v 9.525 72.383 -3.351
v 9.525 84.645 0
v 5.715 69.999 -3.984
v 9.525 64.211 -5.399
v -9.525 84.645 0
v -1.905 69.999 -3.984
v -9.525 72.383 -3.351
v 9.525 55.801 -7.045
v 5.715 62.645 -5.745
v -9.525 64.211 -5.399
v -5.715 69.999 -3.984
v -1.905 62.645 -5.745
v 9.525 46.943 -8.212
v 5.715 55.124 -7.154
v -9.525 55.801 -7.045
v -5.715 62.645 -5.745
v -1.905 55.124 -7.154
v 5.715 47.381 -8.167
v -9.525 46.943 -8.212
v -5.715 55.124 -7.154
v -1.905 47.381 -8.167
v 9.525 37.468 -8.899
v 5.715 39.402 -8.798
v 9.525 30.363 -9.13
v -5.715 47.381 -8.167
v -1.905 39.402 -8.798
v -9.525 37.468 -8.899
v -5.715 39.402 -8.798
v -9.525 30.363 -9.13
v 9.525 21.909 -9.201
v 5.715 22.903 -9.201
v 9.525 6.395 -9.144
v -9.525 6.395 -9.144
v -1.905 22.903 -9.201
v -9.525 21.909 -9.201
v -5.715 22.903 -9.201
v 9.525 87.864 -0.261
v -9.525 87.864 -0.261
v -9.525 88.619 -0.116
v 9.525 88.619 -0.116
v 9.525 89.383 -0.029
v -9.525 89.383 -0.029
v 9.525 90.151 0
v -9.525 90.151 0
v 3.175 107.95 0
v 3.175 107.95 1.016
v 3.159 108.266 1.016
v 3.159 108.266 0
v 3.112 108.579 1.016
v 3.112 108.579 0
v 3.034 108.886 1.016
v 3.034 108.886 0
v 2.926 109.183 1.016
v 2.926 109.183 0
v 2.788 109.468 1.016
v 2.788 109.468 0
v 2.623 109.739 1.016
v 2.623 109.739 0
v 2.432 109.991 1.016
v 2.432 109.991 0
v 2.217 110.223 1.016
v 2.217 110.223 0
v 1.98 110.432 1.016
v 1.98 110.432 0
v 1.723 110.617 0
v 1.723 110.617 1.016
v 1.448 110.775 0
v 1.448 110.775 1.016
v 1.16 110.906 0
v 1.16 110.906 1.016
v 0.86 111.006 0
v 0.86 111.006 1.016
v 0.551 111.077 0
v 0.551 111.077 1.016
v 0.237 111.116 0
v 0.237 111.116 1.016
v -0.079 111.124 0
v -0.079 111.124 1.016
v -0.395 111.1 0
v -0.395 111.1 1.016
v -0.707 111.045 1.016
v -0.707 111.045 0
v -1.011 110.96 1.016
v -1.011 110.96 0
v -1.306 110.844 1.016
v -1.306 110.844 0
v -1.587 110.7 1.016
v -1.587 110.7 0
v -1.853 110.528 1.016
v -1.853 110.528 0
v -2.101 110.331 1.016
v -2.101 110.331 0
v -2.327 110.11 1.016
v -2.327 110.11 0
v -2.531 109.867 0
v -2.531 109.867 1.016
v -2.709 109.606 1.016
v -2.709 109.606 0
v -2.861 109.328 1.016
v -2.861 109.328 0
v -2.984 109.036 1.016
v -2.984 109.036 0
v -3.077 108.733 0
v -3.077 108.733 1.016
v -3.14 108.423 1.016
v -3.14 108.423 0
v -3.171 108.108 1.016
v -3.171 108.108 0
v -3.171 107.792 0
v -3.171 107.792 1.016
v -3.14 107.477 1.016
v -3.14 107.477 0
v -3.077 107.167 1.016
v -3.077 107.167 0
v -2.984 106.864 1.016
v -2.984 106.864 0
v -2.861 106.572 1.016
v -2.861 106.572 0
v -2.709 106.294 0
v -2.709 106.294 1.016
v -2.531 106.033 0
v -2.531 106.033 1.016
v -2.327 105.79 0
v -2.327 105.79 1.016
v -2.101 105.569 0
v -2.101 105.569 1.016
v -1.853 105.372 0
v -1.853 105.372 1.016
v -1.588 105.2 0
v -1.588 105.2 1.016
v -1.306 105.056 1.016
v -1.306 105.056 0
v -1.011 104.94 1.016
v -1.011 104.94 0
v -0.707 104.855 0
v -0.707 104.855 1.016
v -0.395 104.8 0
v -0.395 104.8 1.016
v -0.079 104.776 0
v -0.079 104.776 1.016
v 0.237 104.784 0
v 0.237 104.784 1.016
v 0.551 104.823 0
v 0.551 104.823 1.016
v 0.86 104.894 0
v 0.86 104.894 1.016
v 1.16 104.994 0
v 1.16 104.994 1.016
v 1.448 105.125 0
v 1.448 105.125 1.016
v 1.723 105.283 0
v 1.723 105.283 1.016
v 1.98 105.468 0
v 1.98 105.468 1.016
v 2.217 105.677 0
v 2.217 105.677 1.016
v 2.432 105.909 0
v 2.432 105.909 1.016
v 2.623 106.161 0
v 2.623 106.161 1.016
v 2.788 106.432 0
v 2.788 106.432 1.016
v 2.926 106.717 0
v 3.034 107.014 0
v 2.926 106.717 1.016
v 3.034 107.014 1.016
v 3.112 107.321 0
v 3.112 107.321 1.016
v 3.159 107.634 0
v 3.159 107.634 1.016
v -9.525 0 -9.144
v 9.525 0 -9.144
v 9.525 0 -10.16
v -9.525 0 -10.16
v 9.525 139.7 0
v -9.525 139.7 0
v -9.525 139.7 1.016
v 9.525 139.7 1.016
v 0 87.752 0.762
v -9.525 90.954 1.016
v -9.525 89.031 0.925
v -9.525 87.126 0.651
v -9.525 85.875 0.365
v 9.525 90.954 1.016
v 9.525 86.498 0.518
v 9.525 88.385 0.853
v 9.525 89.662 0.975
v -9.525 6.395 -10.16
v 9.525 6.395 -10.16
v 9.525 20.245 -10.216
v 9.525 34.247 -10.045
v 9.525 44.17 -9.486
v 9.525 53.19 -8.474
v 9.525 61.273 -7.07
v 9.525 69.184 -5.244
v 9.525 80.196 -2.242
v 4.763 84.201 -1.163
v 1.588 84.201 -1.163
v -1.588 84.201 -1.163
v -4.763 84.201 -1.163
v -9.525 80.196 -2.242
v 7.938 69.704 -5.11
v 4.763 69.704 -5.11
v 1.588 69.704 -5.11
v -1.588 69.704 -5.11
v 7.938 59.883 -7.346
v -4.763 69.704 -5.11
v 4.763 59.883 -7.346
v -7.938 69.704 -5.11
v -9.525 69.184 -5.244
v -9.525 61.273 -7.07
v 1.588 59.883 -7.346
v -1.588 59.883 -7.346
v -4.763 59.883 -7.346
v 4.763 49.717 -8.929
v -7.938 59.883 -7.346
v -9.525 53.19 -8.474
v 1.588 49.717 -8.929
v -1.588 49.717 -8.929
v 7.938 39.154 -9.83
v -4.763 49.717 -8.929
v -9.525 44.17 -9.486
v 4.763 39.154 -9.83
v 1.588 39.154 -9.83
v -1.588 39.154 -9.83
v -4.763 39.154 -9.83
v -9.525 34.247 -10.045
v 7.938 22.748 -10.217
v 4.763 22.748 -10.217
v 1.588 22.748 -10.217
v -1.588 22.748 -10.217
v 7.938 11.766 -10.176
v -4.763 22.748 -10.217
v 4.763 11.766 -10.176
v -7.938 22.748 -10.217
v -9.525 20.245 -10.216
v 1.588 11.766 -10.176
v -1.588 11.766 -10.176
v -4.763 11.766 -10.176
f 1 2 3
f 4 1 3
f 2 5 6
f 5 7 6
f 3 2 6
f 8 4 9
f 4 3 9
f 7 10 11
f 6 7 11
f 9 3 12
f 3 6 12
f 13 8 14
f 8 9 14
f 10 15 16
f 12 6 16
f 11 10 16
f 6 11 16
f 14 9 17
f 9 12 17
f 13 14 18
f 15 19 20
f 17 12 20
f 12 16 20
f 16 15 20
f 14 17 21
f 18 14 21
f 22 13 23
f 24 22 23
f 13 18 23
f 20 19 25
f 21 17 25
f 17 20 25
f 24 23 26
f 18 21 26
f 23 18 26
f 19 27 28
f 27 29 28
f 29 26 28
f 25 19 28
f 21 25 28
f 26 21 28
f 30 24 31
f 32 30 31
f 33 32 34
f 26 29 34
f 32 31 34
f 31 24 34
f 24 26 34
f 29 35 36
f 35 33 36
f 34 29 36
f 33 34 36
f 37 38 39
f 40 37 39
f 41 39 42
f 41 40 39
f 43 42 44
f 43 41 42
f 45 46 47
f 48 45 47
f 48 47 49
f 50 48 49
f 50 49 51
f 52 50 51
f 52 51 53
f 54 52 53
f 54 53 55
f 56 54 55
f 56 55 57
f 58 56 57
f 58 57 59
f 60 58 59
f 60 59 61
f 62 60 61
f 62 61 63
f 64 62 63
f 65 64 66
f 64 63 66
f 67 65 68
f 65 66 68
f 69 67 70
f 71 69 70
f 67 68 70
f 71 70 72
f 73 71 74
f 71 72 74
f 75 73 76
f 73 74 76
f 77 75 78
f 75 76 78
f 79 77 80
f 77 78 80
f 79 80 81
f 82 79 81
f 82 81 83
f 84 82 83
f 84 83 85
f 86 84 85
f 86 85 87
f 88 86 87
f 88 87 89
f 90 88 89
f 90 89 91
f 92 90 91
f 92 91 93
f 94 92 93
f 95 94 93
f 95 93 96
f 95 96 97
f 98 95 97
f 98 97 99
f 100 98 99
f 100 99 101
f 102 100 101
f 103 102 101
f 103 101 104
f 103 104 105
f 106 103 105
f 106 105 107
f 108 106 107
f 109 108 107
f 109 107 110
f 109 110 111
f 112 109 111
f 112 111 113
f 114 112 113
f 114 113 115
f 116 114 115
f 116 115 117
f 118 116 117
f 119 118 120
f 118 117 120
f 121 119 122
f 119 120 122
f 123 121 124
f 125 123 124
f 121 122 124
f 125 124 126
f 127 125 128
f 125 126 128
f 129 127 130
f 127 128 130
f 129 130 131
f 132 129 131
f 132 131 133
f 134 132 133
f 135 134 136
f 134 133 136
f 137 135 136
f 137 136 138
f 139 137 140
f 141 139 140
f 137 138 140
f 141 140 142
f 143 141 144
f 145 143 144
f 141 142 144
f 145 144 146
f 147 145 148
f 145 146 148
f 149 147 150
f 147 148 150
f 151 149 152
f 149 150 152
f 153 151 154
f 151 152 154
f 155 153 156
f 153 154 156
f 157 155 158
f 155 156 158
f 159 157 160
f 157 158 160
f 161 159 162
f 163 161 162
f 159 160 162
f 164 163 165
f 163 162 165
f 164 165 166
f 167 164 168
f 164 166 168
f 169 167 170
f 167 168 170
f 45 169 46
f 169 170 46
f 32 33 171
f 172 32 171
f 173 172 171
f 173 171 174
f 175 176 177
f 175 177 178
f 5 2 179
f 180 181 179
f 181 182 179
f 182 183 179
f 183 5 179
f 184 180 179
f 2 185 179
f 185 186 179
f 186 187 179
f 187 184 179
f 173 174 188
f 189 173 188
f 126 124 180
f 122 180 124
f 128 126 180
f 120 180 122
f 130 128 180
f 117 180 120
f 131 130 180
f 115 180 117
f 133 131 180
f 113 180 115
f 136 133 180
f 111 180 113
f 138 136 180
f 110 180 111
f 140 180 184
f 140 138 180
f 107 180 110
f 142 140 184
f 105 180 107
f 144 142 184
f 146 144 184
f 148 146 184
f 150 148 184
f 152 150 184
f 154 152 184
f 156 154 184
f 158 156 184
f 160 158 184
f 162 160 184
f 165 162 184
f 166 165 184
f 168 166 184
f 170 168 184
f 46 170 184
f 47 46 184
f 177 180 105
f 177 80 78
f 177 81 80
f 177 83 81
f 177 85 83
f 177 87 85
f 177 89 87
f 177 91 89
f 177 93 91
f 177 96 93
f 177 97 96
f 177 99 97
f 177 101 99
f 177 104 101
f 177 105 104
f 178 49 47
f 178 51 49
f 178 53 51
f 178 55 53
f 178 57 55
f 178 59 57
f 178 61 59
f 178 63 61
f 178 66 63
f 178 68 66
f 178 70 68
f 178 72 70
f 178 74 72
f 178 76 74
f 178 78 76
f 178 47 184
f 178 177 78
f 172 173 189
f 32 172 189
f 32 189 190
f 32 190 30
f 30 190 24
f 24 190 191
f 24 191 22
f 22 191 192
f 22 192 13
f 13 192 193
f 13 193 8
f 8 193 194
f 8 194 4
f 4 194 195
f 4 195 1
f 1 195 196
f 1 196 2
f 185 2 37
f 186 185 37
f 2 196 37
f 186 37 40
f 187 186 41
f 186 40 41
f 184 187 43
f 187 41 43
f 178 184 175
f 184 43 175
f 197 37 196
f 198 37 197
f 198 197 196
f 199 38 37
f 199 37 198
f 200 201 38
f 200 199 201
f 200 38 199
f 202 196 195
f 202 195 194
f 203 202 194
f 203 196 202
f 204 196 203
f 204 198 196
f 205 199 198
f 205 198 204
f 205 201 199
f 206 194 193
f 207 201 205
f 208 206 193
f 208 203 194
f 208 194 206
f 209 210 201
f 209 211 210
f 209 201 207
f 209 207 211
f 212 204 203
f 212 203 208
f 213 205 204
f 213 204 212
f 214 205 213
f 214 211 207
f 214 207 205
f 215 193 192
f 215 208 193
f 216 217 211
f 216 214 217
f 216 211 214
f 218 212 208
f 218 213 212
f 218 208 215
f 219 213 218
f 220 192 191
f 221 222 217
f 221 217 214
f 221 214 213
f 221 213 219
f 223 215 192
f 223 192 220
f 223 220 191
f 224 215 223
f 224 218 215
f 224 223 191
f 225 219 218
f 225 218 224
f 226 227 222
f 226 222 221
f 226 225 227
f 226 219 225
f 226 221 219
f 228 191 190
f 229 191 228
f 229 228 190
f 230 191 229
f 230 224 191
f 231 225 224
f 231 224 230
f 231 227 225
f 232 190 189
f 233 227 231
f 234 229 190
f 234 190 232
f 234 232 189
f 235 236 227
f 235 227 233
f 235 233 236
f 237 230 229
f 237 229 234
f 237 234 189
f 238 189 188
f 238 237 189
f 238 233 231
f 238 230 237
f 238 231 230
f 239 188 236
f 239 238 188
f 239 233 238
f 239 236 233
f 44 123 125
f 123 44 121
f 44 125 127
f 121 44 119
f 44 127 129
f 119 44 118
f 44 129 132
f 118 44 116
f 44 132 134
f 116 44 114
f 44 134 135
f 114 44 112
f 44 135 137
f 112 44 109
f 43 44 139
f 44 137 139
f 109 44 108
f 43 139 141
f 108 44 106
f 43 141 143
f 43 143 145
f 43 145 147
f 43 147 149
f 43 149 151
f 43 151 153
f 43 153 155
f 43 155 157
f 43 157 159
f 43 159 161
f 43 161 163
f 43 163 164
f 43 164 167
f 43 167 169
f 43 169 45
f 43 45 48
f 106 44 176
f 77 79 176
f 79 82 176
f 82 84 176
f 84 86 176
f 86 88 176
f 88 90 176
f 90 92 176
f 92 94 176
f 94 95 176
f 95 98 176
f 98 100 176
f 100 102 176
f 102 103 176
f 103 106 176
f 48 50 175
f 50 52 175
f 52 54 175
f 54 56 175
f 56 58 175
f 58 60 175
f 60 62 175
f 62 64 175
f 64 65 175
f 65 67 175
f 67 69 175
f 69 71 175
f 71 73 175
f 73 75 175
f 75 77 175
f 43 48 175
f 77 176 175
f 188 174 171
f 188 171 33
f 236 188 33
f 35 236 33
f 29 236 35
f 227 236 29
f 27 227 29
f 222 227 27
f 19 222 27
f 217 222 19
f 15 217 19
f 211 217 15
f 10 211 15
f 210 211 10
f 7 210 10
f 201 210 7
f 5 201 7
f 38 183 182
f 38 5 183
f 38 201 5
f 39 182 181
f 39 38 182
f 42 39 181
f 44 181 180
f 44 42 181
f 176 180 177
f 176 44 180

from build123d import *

# Parameters (mm, degrees)
SKETCH1_W           = 19.05
SKETCH1_H           = 139.7
BOSS_EXTRUDE1_DEPTH = 1.016
SKETCH2_R           = 3.175
CUT_EXTRUDE1_DEPTH  = 141.028025341
BOSS_EXTRUDE2_START = -19.05
BOSS_EXTRUDE2_DEPTH = 19.05
CUT_EXTRUDE2_DEPTH  = 142.362614158
FILLET1_R           = 10.16


# Read off the part's stored shape, not the designer's step: Boss-Extrude2
with BuildPart() as part:
    # Sketch1 → Boss-Extrude1 (new body)
    with BuildSketch(Plane.XY):
        with Locations((0, 69.85)):
            Rectangle(SKETCH1_W, SKETCH1_H)
    extrude(amount=BOSS_EXTRUDE1_DEPTH)

    # Sketch2 → Cut-Extrude1 (cut, through all)
    with BuildSketch(Plane.XY.offset(1.016)):
        with Locations((0, 107.95)):
            Circle(SKETCH2_R)
    extrude(amount=-CUT_EXTRUDE1_DEPTH, mode=Mode.SUBTRACT)

    # Boss-Extrude2 outline → Boss-Extrude2 (add)
    with BuildSketch(Plane(origin=(9.525, 0, 0), x_dir=(0, 0, -1), z_dir=(1, 0, 0)).offset(BOSS_EXTRUDE2_START)):
        with BuildLine():
            add(Edge.make_bspline(
                [(-1e-08, 89.021856582), (0.353951992, 87.40678329), (1.153670007, 84.14800116), (2.913866895, 77.737270865), (5.184849484, 69.73490743), (7.461415384, 59.944664253), (9.047721746, 49.78686922), (9.924339704, 39.212202023), (10.183044993, 30.10799928), (10.225102879, 22.747853486), (10.207581307, 17.22630398), (10.179157942, 12.664005658), (10.163337481, 9.05650551), (10.16, 7.285124222), (10.16, 6.395385599)],
                knots=[0.00134616, 0.00134616, 0.00134616, 0.00134616, 0.0625, 0.125, 0.25, 0.375, 0.5, 0.625, 0.75, 0.8125, 0.875, 0.9375, 0.96875, 1, 1, 1, 1], degree=3))
            Line((-1e-08, 89.021856582), (0, 84.644701296))
            add(Edge.make_bspline(
                [(0, 84.644701296), (3.804384443, 69.740616889), (9.143429465, 56.08795928), (9.602178505, 40.318745924), (9.144, 22.473473321), (9.144, 6.395385599)],
                knots=[0.053605471, 0.053605471, 0.053605471, 0.053605471, 0.053605471, 0.053605471, 1, 1, 1, 1, 1, 1], degree=5))
            Line((9.144, 6.395385599), (9.144, 0))
            Line((9.144, 0), (10.16, 0))
            Line((10.16, 0), (10.16, 6.395385599))
        make_face()
    extrude(amount=BOSS_EXTRUDE2_DEPTH)

    # Sketch4 → Cut-Extrude2 (cut, through all)
    with BuildSketch(Plane(origin=(9.525, 0, 0), x_dir=(0, 0, -1), z_dir=(1, 0, 0))):
        with BuildLine():
            Line((-1.016, 90.953756608), (-1.016, 0))
            Line((-1.016, 0), (0, 0))
            Line((0, 0), (0, 84.644701296))
            add(Edge.make_bspline(
                [(0, 84.644701296), (-1.016, 87.704234075), (-1.016, 90.953756608)],
                knots=[0, 0, 0, 1, 1, 1], degree=2))
        make_face()
    extrude(amount=-CUT_EXTRUDE2_DEPTH, mode=Mode.SUBTRACT)

    # Fillet1
    fillet1_edges = [part.edges().sort_by_distance(p)[0] for p in [
        (0, 89.021856582, 1e-08),
    ]]
    fillet(fillet1_edges, radius=FILLET1_R)


solid = part.part
